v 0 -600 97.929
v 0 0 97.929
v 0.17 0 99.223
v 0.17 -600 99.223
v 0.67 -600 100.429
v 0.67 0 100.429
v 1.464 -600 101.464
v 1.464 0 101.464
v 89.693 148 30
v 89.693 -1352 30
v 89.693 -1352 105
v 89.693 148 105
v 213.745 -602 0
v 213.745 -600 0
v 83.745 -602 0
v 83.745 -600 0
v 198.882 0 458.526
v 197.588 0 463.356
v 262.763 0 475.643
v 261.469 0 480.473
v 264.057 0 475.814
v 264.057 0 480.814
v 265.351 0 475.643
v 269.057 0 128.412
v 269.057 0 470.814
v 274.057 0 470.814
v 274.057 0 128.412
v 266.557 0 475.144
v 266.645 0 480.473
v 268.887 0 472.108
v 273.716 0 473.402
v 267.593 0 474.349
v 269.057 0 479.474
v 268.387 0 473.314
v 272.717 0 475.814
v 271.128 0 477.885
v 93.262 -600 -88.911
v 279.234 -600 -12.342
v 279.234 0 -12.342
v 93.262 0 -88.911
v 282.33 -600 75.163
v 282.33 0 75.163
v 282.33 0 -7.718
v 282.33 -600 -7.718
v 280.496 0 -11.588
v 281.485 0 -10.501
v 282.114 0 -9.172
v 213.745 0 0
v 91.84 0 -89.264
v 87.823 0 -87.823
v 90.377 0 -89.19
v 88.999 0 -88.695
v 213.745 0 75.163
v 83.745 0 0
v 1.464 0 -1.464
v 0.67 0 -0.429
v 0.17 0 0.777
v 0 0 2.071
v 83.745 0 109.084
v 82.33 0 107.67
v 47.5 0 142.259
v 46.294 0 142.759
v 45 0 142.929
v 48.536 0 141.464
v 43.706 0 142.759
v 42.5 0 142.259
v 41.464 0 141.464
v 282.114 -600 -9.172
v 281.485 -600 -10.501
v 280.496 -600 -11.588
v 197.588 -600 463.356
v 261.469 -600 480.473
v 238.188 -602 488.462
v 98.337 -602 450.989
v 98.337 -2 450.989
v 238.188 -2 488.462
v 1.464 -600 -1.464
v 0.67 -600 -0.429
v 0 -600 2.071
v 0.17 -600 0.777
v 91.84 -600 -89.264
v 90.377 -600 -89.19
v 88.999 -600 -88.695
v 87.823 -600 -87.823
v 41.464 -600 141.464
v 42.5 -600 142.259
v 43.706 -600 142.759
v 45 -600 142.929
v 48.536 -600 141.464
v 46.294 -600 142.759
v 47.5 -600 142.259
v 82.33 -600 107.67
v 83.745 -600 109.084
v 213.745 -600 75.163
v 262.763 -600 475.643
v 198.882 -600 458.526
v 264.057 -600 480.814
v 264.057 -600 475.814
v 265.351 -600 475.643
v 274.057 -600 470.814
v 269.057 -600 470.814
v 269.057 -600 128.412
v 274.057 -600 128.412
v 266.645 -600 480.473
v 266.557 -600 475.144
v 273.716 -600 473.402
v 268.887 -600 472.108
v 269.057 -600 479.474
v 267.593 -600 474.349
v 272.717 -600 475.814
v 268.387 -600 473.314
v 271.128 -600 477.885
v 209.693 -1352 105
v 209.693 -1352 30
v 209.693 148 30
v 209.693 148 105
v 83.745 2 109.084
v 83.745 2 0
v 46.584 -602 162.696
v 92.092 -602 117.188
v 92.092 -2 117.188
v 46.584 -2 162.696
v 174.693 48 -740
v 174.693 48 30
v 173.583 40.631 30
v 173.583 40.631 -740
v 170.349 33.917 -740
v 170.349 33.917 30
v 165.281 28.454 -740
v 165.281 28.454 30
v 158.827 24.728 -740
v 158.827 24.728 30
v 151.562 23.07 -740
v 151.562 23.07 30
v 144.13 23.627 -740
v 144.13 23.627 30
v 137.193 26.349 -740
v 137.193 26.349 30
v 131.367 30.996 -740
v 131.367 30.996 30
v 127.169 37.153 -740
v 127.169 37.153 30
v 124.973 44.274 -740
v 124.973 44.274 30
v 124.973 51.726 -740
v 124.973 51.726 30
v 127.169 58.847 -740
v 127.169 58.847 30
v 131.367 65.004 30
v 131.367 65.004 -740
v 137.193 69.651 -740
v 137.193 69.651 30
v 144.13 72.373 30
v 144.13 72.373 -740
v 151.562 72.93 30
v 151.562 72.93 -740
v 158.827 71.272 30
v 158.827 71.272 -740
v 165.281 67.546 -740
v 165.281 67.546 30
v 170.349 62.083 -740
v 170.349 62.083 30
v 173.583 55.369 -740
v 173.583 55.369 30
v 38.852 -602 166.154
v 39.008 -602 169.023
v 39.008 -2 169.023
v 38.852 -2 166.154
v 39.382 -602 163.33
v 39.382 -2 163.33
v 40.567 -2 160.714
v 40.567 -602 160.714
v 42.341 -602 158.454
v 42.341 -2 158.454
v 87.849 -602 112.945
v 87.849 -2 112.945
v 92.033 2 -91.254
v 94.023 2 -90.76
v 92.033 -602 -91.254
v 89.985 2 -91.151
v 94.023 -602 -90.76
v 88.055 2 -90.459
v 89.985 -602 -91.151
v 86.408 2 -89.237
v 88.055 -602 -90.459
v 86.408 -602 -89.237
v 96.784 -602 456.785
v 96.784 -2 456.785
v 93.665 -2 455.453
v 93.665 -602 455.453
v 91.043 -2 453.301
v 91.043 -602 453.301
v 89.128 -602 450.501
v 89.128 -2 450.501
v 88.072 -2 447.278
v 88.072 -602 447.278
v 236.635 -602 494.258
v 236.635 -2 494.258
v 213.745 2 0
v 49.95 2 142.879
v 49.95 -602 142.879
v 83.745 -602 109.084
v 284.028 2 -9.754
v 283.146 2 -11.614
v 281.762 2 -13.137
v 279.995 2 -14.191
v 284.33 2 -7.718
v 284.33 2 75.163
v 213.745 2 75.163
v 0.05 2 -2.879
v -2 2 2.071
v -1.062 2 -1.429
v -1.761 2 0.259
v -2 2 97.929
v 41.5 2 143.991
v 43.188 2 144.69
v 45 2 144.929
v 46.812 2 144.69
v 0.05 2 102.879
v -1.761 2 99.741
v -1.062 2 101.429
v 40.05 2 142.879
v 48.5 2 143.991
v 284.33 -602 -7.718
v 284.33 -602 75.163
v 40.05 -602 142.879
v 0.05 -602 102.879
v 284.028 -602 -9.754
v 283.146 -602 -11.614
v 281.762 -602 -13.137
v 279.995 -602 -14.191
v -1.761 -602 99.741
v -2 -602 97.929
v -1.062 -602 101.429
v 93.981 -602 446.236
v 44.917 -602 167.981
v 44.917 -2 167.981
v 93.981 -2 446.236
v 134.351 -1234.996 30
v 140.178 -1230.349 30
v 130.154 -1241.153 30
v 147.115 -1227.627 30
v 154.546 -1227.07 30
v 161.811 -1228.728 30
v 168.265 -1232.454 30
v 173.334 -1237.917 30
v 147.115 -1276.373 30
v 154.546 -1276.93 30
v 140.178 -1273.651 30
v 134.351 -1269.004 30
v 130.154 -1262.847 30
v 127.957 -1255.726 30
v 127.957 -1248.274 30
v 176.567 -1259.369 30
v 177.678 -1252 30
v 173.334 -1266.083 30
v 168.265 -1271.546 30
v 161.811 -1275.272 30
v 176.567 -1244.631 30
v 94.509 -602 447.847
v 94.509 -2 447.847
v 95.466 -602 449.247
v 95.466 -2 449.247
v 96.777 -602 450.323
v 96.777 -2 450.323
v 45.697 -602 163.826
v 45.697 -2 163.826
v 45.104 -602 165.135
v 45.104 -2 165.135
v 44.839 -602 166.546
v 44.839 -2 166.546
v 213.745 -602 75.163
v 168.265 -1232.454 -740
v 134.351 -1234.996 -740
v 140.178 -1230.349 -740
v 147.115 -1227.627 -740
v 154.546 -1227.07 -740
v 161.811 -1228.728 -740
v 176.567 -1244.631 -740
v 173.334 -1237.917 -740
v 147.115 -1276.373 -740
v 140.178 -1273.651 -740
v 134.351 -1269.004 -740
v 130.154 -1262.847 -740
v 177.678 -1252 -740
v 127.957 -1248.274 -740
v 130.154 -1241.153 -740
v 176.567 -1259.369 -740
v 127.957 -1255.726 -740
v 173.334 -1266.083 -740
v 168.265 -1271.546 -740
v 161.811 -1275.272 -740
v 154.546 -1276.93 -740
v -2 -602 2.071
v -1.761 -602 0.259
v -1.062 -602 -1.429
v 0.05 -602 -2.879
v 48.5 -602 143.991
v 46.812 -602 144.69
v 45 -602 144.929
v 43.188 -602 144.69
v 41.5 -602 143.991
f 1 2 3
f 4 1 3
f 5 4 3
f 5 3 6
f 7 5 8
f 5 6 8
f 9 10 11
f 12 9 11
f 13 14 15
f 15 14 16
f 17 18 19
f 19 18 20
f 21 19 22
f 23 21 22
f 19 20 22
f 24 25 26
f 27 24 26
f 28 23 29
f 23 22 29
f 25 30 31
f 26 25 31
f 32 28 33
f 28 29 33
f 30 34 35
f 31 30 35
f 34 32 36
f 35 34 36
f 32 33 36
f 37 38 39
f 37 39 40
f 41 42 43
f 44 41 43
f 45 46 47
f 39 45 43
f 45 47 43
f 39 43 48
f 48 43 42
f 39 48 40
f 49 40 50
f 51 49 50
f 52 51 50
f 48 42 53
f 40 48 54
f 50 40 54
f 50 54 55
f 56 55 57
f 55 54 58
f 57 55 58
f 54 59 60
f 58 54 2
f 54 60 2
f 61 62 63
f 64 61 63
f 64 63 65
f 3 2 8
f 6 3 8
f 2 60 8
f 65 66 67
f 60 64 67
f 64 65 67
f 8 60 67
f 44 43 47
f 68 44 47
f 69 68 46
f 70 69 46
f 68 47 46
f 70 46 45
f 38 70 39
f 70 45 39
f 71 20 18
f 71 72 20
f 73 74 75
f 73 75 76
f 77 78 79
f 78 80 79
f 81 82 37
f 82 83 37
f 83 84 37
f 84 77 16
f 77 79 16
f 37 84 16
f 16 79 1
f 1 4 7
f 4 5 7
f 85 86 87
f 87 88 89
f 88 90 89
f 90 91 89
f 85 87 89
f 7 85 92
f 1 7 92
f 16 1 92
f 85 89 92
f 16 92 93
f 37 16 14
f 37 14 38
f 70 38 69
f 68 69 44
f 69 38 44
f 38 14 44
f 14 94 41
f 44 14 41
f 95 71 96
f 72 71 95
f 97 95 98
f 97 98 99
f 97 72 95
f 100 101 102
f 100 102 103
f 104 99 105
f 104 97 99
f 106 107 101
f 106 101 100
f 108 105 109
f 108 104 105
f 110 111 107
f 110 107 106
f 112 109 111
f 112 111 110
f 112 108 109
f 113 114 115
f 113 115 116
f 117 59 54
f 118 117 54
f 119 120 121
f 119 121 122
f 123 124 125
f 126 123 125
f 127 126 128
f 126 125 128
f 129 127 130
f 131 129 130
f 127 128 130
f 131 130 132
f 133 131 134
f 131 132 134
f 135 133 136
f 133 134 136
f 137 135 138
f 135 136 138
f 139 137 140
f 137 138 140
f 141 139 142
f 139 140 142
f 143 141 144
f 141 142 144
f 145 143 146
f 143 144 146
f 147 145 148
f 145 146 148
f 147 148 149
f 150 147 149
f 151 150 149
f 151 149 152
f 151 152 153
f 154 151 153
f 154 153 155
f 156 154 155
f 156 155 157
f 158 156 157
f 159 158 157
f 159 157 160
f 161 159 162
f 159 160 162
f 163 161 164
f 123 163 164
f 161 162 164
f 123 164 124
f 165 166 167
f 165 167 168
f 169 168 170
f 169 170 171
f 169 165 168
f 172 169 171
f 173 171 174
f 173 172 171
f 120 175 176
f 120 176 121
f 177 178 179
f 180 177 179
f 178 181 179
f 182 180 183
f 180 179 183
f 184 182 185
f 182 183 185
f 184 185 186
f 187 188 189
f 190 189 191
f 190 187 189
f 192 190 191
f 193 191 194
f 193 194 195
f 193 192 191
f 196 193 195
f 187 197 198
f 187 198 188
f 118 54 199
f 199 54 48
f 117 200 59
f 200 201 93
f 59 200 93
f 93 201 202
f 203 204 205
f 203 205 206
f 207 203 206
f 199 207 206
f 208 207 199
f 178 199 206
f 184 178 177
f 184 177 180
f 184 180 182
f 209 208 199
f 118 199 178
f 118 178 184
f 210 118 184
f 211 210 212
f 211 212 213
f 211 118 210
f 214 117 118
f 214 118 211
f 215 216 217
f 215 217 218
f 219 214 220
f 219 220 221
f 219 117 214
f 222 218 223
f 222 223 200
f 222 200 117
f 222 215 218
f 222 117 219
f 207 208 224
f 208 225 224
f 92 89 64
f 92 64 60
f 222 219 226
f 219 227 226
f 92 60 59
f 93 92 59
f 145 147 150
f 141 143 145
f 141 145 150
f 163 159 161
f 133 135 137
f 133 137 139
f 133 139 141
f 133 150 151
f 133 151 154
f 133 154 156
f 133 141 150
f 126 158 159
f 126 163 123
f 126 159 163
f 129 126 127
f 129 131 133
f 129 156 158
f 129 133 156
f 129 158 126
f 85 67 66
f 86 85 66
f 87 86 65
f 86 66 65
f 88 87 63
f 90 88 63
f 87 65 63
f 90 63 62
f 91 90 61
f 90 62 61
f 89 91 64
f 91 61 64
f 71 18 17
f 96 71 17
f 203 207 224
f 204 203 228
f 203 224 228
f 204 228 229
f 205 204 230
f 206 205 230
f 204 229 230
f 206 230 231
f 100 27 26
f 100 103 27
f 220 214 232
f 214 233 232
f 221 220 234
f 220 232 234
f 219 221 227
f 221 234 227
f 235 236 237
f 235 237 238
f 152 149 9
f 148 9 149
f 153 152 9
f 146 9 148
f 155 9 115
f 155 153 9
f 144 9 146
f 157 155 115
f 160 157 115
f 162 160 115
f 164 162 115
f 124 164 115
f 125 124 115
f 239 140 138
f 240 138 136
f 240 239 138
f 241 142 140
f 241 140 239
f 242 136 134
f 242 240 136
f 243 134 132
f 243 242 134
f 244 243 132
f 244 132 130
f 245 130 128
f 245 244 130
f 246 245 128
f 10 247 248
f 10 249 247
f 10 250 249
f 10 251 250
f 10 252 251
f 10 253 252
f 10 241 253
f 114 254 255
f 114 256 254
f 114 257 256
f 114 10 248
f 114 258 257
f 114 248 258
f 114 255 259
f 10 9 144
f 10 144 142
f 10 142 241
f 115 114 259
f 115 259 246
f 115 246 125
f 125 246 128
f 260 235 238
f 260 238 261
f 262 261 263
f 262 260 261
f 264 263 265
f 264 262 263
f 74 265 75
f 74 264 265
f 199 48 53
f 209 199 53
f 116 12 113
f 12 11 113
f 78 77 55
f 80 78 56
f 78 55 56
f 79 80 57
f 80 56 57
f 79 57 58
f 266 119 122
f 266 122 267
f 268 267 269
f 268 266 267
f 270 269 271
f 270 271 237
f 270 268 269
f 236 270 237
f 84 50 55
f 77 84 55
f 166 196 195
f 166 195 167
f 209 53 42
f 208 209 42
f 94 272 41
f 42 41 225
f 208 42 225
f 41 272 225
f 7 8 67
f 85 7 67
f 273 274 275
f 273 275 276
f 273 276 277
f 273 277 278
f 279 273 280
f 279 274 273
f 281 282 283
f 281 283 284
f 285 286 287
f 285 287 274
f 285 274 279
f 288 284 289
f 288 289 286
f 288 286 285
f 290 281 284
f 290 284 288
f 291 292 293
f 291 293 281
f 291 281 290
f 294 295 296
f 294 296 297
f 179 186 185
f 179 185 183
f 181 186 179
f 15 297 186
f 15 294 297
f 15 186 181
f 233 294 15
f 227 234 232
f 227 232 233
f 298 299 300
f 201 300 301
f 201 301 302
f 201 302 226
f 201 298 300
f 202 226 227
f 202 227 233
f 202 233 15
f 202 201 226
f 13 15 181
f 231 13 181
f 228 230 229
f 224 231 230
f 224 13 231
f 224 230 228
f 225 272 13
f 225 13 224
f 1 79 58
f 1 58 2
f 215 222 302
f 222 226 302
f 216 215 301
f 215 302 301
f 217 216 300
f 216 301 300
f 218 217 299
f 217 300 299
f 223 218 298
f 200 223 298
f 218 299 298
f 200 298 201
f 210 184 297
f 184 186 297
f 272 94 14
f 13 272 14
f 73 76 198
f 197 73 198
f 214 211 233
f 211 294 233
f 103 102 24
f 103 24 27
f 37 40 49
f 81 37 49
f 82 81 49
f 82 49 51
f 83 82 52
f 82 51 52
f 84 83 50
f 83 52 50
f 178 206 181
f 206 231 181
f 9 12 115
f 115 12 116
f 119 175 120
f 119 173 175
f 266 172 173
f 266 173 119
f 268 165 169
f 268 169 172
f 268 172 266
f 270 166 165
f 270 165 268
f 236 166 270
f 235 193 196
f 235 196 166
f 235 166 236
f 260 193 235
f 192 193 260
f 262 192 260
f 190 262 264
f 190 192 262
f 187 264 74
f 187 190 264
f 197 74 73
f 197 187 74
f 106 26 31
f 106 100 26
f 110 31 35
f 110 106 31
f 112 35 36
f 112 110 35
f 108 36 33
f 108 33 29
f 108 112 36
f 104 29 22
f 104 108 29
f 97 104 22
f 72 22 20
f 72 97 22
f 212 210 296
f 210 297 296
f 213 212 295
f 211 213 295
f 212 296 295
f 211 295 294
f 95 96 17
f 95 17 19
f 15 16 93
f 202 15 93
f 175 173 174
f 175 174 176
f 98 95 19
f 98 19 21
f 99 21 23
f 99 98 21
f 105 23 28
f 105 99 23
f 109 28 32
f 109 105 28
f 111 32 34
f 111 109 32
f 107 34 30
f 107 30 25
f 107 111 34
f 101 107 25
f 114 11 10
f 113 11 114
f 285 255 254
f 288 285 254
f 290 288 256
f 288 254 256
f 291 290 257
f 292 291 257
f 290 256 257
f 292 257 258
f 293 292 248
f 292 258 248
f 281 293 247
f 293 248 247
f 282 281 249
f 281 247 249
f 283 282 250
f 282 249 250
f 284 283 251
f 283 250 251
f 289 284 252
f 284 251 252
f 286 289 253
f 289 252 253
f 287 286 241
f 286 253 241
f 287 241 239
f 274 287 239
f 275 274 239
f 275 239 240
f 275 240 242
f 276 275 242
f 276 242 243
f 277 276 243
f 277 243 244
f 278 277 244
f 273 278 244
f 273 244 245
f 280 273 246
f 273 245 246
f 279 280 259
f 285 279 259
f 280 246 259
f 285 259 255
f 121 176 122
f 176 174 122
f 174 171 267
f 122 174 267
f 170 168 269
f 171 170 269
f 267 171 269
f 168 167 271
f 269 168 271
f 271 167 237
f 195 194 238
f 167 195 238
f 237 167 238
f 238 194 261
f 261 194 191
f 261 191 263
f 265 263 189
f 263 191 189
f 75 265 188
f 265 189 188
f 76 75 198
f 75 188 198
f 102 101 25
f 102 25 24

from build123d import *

# Parameters (mm, degrees)
F1_DEPTH  = 600
F3_DEPTH  = 2
F5_DEPTH  = 2
F7_DEPTH  = 600
F8_W      = 120
F8_H      = 75
F9_DEPTH  = 750
F12_DEPTH = 300
F13_R     = 25
F14_DEPTH = 770


with BuildPart() as f1:
    # F0 (on Front) → F1 (new body)
    with BuildSketch(Plane.XZ):
        with BuildLine():
            ThreePointArc((1.4644660941, -1.4644660941), (0.3806023374, 0.15765065), (0, 2.0710678119))
            Line((0, 2.0710678119), (0, 97.9289321881))
            ThreePointArc((0, 97.9289321881), (0.3806023374, 99.84234935), (1.4644660941, 101.4644660941))
            Line((1.4644660941, 101.4644660941), (41.4644660941, 141.4644660941))
            ThreePointArc((41.4644660941, 141.4644660941), (45, 142.9289321881), (48.5355339059, 141.4644660941))
            Line((48.5355339059, 141.4644660941), (82.3303307434, 107.6696692566))
            Line((82.3303307434, 107.6696692566), (83.7445443058, 109.0838828189))
            Line((83.7445443058, 109.0838828189), (49.9497474683, 142.8786796564))
            ThreePointArc((49.9497474683, 142.8786796564), (45, 144.9289321881), (40.0502525317, 142.8786796564))
            Line((40.0502525317, 142.8786796564), (0.0502525317, 102.8786796564))
            ThreePointArc((0.0502525317, 102.8786796564), (-1.4671567276, 100.6077162147), (-2, 97.9289321881))
            Line((-2, 97.9289321881), (-2, 2.0710678119))
            ThreePointArc((-2, 2.0710678119), (-1.4671567276, -0.6077162147), (0.0502525317, -2.8786796564))
            Line((0.0502525317, -2.8786796564), (86.4083997077, -89.2368268324))
            ThreePointArc((86.4083997077, -89.2368268324), (89.9852068491, -91.1511186165), (94.0231555726, -90.7599249706))
            Line((94.0231555726, -90.7599249706), (279.99533914, -14.1912161103))
            ThreePointArc((279.99533914, -14.1912161103), (283.1464746024, -11.6135560721), (284.3303307434, -7.7183705037))
            Line((284.3303307434, -7.7183705037), (284.3303307434, 75.1631110907))
            Line((284.3303307434, 75.1631110907), (282.3303307434, 75.1631110907))
            Line((282.3303307434, 75.1631110907), (282.3303307434, -7.7183705037))
            ThreePointArc((282.3303307434, -7.7183705037), (281.4847192141, -10.5006459097), (279.2339081696, -12.3418316513))
            Line((279.2339081696, -12.3418316513), (93.2617246021, -88.9105405116))
            ThreePointArc((93.2617246021, -88.9105405116), (90.3774755139, -89.1899645444), (87.82261327, -87.82261327))
            Line((87.82261327, -87.82261327), (1.4644660941, -1.4644660941))
        make_face()
    extrude(amount=F1_DEPTH)

    # F2 (on face) → F3 (join)
    with BuildSketch(Plane.XZ.offset(600)):
        with BuildLine():
            Line((83.7445443058, 109.0838828189), (49.9497474683, 142.8786796564))
            ThreePointArc((49.9497474683, 142.8786796564), (45, 144.9289321881), (40.0502525317, 142.8786796564))
            Line((40.0502525317, 142.8786796564), (0.0502525317, 102.8786796564))
            ThreePointArc((0.0502525317, 102.8786796564), (-1.4671567276, 100.6077162147), (-2, 97.9289321881))
            Line((-2, 97.9289321881), (-2, 2.0710678119))
            ThreePointArc((-2, 2.0710678119), (-1.4671567276, -0.6077162147), (0.0502525317, -2.8786796564))
            Line((0.0502525317, -2.8786796564), (86.4083997077, -89.2368268324))
            ThreePointArc((86.4083997077, -89.2368268324), (89.9852068491, -91.1511186165), (94.0231555726, -90.7599249706))
            Line((94.0231555726, -90.7599249706), (279.99533914, -14.1912161103))
            ThreePointArc((279.99533914, -14.1912161103), (283.1464746024, -11.6135560721), (284.3303307434, -7.7183705037))
            Line((284.3303307434, -7.7183705037), (284.3303307434, 75.1631110907))
            Line((284.3303307434, 75.1631110907), (213.7445443058, 75.1631110907))
            Line((213.7445443058, 75.1631110907), (213.7445443058, 0))
            Line((213.7445443058, 0), (83.7445443058, 0))
            Line((83.7445443058, 0), (83.7445443058, 109.0838828189))
        make_face()
    extrude(amount=F3_DEPTH)

    # F4 (on face) → F5 (join)
    with BuildSketch(Plane(origin=(0, 0, 0), x_dir=(-1, 0, 0), z_dir=(0, 1, 0))):
        with BuildLine():
            Line((-213.7445443058, 75.1631110907), (-284.3303307434, 75.1631110907))
            Line((-284.3303307434, 75.1631110907), (-284.3303307434, -7.7183705037))
            ThreePointArc((-284.3303307434, -7.7183705037), (-283.1464746024, -11.6135560721), (-279.99533914, -14.1912161103))
            Line((-279.99533914, -14.1912161103), (-94.0231555726, -90.7599249706))
            ThreePointArc((-94.0231555726, -90.7599249706), (-89.9852068491, -91.1511186165), (-86.4083997077, -89.2368268324))
            Line((-86.4083997077, -89.2368268324), (-0.0502525317, -2.8786796564))
            ThreePointArc((-0.0502525317, -2.8786796564), (1.4671567276, -0.6077162147), (2, 2.0710678119))
            Line((2, 2.0710678119), (2, 97.9289321881))
            ThreePointArc((2, 97.9289321881), (1.4671567276, 100.6077162147), (-0.0502525317, 102.8786796564))
            Line((-0.0502525317, 102.8786796564), (-40.0502525317, 142.8786796564))
            ThreePointArc((-40.0502525317, 142.8786796564), (-45, 144.9289321881), (-49.9497474683, 142.8786796564))
            Line((-49.9497474683, 142.8786796564), (-83.7445443058, 109.0838828189))
            Line((-83.7445443058, 109.0838828189), (-83.7445443058, 0))
            Line((-83.7445443058, 0), (-213.7445443058, 0))
            Line((-213.7445443058, 0), (-213.7445443058, 75.1631110907))
        make_face()
    extrude(amount=F5_DEPTH)


with BuildPart() as f7:
    # F6 (on face) → F7 (new body)
    with BuildSketch(Plane.XZ.offset(602)):
        with BuildLine():
            Line((87.8490793277, 112.9453565157), (92.0917200148, 117.1879972028))
            Line((92.0917200148, 117.1879972028), (46.5835144764, 162.6962027412))
            ThreePointArc((46.5835144764, 162.6962027412), (45.103853459, 165.1346086313), (44.9173086454, 167.9807324944))
            Line((44.9173086454, 167.9807324944), (93.9811580473, 446.2356496077))
            ThreePointArc((93.9811580473, 446.2356496077), (95.4663405445, 449.2473017874), (98.3370902948, 450.9893154994))
            Line((98.3370902948, 450.9893154994), (238.1879532962, 488.4622413014))
            Line((238.1879532962, 488.4622413014), (236.6350390256, 494.2577962592))
            Line((236.6350390256, 494.2577962592), (96.7841760241, 456.7848704571))
            ThreePointArc((96.7841760241, 456.7848704571), (91.0426765237, 453.300843033), (88.0723115292, 447.2775386737))
            Line((88.0723115292, 447.2775386737), (39.0084621274, 169.0226215604))
            ThreePointArc((39.0084621274, 169.0226215604), (39.3815517545, 163.3303738343), (42.3408737893, 158.4535620541))
            Line((42.3408737893, 158.4535620541), (87.8490793277, 112.9453565157))
        make_face()
    extrude(amount=-F7_DEPTH)


with BuildPart() as f9:
    # F8 (on face) → F9 (new body, symmetric)
    with BuildSketch(Plane.XZ.offset(602)):
        with Locations((149.6933400631, 67.5)):
            Rectangle(F8_W, F8_H)
    extrude(amount=F9_DEPTH, both=True)

    # F13 (on face) → F14 (join)
    with BuildSketch(Plane(origin=(0, 0, 30), x_dir=(1, 0, 0), z_dir=(0, 0, -1))):
        with Locations((152.6777621258, 1252)):
            Circle(F13_R)
        with Locations((149.6933400631, -48)):
            Circle(F13_R)
    extrude(amount=F14_DEPTH)


with BuildPart() as f12:
    # F11 (on mid) → F12 (new body, symmetric)
    with BuildSketch(Plane.XZ.offset(300)):
        with BuildLine():
            Line((261.4689141435, 480.4728531501), (197.588081, 463.3560354974))
            Line((197.588081, 463.3560354974), (198.8821762255, 458.526406366))
            Line((198.8821762255, 458.526406366), (262.763009369, 475.6432240186))
            ThreePointArc((262.763009369, 475.6432240186), (267.1009117396, 474.7803615886), (269.0571045946, 470.8135948872))
            Line((269.0571045946, 470.8135948872), (269.0571045946, 128.4116242641))
            Line((269.0571045946, 128.4116242641), (274.0571045946, 128.4116242641))
            Line((274.0571045946, 128.4116242641), (274.0571045946, 470.8135948872))
            ThreePointArc((274.0571045946, 470.8135948872), (270.1447188846, 478.7471282901), (261.4689141435, 480.4728531501))
        make_face()
    extrude(amount=F12_DEPTH, both=True)


solid = Compound([f1.part, f7.part, f9.part, f12.part])
